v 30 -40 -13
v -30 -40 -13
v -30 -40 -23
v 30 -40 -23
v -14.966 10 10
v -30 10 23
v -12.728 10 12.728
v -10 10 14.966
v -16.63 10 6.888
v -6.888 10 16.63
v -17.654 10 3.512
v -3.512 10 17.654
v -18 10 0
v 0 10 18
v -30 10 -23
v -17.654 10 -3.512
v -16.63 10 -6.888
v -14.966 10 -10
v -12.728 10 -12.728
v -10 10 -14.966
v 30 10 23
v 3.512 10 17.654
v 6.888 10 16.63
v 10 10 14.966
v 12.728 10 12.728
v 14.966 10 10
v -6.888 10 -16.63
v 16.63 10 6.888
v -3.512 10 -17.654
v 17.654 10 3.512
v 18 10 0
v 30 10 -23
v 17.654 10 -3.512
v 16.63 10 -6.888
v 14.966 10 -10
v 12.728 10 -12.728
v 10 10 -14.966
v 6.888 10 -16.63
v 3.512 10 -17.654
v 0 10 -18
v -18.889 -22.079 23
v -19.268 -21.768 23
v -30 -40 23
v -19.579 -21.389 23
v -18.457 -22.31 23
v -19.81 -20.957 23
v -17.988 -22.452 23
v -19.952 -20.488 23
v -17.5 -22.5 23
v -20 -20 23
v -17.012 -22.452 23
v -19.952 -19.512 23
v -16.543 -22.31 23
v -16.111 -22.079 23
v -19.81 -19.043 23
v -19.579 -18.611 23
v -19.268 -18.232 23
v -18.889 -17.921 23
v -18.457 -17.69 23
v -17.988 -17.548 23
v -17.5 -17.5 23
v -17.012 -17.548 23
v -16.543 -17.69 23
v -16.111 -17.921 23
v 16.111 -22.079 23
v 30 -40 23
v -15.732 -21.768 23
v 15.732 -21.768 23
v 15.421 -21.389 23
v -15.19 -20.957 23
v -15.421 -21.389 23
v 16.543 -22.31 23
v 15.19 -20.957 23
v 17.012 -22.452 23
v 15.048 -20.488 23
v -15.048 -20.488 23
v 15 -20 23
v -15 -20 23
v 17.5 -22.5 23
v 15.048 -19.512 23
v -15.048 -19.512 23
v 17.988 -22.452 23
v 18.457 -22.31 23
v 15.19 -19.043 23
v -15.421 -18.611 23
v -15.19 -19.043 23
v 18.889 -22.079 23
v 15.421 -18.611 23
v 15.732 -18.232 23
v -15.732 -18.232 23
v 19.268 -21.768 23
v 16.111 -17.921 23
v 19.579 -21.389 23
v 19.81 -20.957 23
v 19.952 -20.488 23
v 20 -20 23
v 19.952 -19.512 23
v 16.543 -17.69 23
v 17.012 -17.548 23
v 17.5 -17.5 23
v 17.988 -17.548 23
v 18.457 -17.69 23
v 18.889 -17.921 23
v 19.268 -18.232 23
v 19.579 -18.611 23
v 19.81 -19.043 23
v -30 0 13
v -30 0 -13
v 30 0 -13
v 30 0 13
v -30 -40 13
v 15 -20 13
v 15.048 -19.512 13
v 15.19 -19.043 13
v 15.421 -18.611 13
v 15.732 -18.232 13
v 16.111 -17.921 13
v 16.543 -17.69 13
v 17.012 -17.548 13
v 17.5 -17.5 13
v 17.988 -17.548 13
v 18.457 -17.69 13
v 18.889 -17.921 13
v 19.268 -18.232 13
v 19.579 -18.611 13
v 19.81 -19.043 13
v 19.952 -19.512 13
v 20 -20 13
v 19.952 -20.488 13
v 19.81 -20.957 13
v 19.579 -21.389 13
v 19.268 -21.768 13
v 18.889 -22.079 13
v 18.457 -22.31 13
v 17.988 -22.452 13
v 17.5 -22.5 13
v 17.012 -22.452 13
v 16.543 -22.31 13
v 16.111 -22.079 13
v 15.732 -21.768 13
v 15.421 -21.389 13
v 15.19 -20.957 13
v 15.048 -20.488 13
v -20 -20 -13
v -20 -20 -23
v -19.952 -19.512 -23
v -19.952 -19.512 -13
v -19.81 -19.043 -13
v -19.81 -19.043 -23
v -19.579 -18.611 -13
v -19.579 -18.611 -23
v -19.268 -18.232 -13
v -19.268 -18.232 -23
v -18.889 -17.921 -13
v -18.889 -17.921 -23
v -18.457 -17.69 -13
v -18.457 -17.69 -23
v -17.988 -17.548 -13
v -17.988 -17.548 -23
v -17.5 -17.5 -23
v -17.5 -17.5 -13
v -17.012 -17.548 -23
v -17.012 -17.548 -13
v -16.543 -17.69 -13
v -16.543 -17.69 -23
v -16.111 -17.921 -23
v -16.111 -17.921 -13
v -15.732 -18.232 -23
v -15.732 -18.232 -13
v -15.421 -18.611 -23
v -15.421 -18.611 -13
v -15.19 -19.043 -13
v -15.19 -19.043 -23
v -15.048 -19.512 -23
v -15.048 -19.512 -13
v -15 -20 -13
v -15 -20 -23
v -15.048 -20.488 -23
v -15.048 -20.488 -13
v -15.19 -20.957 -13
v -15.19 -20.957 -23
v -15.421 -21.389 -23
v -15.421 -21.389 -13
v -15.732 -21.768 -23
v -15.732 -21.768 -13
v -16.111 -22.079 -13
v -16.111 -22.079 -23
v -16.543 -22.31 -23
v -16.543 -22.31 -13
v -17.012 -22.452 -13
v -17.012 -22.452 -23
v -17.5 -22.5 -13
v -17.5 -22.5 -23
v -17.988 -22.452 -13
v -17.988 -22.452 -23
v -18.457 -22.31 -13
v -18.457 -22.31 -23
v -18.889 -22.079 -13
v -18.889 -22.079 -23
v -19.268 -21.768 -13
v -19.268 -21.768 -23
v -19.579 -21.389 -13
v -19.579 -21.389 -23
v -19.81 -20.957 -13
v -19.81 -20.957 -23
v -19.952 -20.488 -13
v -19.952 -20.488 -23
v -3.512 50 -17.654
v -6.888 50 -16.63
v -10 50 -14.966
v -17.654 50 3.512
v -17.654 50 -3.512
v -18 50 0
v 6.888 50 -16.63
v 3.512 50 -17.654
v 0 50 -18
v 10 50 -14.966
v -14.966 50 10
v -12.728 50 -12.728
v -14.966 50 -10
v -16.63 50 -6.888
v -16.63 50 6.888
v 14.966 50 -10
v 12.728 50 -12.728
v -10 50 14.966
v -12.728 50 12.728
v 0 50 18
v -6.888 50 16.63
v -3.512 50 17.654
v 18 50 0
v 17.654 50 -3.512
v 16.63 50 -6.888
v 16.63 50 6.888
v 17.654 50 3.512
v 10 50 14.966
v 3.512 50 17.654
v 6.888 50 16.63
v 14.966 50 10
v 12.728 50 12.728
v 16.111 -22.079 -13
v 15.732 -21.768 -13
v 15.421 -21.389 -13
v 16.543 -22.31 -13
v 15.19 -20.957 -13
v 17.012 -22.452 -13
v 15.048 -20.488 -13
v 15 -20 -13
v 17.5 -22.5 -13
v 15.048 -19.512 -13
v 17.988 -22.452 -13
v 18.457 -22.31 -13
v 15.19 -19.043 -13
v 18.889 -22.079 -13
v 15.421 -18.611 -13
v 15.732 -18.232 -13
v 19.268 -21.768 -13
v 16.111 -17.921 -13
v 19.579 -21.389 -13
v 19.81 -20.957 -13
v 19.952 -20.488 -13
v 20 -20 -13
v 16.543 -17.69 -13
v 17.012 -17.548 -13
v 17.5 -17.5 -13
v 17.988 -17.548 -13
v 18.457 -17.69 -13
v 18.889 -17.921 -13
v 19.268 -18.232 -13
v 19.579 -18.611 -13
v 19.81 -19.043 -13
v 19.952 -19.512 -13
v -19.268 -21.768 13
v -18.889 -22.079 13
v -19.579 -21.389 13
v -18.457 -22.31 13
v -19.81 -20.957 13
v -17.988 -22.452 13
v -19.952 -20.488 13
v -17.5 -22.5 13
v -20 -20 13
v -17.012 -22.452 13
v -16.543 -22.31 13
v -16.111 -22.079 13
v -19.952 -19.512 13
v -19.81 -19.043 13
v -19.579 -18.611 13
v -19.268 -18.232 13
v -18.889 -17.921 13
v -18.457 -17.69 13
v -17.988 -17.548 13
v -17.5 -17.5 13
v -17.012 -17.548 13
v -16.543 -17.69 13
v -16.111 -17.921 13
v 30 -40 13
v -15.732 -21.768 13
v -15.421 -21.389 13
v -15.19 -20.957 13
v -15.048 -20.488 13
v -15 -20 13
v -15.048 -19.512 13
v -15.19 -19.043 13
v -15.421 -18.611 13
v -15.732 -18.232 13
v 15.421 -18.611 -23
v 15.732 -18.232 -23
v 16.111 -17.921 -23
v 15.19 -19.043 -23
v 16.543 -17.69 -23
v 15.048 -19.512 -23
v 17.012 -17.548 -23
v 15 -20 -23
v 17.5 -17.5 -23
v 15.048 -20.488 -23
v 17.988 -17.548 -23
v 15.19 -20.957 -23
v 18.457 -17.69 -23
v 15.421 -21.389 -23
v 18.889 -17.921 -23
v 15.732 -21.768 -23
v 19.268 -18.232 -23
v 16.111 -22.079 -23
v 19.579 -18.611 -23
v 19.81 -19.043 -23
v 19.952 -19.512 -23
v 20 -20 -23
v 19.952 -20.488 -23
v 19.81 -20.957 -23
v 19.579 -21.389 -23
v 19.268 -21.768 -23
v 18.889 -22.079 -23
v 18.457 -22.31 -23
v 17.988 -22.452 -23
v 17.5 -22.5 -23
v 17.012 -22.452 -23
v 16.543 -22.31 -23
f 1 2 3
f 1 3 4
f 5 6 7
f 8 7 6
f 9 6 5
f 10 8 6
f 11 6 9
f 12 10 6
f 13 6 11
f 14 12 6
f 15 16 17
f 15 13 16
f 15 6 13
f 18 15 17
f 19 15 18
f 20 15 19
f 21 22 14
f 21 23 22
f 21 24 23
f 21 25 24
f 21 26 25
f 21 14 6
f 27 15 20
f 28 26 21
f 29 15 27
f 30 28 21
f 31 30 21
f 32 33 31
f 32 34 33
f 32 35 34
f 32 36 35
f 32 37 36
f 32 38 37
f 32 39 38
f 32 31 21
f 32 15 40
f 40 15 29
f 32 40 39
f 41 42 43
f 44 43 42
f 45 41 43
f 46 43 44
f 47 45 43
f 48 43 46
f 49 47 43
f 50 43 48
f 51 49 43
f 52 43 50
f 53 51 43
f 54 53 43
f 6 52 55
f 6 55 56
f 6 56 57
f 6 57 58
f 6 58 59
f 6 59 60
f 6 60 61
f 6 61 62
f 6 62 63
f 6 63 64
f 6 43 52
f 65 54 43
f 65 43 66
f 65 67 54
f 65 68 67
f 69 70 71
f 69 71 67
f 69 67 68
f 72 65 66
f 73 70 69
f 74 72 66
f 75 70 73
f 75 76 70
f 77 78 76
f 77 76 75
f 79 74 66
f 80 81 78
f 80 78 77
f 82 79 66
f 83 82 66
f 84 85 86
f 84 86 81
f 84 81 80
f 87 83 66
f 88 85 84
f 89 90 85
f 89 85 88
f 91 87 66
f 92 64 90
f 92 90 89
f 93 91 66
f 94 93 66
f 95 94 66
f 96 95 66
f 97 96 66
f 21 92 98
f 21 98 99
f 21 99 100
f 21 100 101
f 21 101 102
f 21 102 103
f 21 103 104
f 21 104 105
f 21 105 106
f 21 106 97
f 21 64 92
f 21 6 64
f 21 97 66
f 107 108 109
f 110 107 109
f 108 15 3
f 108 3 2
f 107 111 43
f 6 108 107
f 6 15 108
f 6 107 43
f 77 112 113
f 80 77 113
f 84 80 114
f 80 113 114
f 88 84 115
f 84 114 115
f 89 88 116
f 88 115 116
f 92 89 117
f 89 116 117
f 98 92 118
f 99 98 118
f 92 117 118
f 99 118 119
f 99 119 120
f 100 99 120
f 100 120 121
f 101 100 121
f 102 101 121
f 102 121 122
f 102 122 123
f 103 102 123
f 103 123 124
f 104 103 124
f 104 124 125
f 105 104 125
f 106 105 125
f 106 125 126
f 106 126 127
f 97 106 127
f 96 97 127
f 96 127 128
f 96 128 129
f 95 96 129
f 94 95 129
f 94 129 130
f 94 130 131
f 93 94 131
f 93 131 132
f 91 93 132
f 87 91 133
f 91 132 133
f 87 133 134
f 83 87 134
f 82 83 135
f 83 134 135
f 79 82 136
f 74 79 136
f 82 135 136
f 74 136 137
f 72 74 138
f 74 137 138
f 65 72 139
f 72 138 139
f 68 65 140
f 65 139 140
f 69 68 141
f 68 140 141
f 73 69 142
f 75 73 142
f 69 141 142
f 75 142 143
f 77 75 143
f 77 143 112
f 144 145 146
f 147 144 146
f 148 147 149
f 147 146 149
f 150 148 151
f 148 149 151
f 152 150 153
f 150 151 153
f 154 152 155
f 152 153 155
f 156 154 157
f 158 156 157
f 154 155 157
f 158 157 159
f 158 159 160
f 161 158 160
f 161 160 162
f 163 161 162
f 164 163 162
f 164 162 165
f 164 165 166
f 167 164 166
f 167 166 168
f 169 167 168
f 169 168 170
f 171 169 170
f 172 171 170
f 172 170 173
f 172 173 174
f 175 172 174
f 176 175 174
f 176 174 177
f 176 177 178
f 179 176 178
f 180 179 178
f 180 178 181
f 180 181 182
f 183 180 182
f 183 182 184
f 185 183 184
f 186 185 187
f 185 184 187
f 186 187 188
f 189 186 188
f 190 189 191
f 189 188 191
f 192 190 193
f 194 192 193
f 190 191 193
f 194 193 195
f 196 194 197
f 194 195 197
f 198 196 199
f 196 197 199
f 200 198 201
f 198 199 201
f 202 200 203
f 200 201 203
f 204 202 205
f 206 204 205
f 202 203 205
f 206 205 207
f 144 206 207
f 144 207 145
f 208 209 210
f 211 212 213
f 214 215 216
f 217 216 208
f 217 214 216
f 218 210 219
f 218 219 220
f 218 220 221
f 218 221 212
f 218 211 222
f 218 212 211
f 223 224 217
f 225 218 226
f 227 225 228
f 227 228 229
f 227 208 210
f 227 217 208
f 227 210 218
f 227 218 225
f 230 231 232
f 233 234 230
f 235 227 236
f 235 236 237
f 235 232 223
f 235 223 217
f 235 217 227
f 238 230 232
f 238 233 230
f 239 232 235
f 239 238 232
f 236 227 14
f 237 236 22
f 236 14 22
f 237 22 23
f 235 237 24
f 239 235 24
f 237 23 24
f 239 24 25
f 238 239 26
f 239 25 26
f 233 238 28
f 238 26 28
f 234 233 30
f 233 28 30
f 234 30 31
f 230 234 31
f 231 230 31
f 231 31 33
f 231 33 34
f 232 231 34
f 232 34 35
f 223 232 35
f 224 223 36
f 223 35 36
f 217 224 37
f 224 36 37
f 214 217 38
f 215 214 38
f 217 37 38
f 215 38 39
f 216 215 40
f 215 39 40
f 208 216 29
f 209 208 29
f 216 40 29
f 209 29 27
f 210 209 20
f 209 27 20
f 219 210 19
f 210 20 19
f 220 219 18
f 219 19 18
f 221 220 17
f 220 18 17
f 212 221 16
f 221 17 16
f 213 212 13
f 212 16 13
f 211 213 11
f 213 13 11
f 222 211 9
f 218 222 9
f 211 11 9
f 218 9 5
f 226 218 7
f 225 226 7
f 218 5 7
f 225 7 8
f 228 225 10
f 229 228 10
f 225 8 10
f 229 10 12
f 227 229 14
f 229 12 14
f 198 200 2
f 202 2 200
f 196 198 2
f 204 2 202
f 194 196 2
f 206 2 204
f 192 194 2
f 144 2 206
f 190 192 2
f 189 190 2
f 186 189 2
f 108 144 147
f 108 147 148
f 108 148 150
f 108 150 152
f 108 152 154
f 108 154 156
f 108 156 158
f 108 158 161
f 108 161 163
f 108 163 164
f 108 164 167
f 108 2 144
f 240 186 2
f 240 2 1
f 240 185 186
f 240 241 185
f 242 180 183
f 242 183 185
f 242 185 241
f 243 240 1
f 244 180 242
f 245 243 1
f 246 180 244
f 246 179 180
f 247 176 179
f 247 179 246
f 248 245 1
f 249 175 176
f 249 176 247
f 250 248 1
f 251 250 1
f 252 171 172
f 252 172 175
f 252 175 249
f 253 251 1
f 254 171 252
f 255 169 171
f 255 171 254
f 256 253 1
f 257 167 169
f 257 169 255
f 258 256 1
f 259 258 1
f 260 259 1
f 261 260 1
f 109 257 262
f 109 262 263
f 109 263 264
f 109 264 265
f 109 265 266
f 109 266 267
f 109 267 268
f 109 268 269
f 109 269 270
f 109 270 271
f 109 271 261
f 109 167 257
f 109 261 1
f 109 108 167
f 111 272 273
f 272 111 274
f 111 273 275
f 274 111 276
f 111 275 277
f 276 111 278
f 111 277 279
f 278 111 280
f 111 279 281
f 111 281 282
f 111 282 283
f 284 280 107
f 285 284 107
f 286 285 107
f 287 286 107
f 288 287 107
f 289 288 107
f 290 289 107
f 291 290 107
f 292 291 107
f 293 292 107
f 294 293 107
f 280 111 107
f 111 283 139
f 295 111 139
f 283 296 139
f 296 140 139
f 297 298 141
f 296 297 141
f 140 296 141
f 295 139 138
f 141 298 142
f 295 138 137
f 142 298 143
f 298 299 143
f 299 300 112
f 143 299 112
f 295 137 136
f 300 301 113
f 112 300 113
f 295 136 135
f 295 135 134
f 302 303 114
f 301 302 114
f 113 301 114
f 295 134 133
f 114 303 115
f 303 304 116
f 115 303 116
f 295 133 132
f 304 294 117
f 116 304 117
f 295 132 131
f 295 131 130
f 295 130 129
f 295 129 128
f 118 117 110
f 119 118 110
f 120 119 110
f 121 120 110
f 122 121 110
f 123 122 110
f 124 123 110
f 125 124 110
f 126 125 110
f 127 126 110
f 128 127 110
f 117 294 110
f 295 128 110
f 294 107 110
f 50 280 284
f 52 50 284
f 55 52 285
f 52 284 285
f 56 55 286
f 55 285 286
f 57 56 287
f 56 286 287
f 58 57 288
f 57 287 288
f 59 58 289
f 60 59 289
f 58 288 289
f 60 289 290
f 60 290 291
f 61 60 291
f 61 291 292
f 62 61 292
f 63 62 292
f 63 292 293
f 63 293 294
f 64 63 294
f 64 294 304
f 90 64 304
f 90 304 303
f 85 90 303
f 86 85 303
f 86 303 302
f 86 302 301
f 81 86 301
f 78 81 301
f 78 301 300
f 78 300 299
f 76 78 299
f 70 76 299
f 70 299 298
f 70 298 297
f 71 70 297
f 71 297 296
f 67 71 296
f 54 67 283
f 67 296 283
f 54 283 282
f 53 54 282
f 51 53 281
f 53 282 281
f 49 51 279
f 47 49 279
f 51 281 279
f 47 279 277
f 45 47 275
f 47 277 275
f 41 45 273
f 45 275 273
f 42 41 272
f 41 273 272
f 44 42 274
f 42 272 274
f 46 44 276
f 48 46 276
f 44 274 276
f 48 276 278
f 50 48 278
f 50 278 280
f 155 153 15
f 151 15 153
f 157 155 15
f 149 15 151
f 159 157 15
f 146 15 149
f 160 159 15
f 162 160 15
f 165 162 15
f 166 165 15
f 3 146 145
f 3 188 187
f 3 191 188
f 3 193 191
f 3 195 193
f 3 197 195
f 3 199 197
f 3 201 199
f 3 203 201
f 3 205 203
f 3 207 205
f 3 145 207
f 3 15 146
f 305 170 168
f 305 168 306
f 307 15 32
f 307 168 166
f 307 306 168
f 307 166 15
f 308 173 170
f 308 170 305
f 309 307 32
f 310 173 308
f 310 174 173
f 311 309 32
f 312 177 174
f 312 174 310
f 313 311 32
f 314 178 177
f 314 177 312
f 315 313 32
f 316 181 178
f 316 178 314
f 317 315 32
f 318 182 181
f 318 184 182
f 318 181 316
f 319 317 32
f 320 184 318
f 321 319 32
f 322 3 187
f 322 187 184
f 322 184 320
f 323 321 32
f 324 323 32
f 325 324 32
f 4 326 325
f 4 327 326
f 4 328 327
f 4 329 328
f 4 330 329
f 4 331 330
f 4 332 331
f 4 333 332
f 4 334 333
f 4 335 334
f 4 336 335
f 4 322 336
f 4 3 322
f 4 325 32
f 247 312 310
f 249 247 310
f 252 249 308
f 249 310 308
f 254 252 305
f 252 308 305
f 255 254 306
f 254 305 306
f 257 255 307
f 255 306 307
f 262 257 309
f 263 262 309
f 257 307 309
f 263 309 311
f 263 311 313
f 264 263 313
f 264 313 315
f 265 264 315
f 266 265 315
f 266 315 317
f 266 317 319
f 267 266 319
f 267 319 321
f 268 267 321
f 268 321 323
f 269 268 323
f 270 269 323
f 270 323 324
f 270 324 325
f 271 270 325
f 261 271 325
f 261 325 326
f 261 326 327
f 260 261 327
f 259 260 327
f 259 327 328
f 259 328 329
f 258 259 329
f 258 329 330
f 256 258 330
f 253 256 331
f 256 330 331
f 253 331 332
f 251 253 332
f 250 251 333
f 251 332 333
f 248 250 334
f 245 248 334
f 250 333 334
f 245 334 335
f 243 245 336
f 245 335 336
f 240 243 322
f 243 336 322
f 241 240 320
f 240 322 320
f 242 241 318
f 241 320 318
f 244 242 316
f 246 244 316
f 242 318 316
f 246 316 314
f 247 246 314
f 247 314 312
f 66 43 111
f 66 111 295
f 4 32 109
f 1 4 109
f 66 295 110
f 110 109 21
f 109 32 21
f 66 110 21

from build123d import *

# Parameters (mm, degrees)
SKETCH1_W           = 60
SKETCH1_H           = 46
BOSS_EXTRUDE1_DEPTH = 10
SKETCH2_W           = 60
SKETCH2_H           = 10
BOSS_EXTRUDE2_DEPTH = 40
SKETCH3_R           = 18
BOSS_EXTRUDE3_DEPTH = 40
SKETCH4_R           = 2.5
CUT_EXTRUDE1_DEPTH  = 75.269778511


with BuildPart() as part:
    # Sketch1 → Boss-Extrude1 (new body)
    with BuildSketch(Plane(origin=(0, 0, 0), x_dir=(1, 0, 0), z_dir=(0, 1, 0))):
        Rectangle(SKETCH1_W, SKETCH1_H)
    extrude(amount=BOSS_EXTRUDE1_DEPTH)

    # Sketch2 → Boss-Extrude2 (add)
    with BuildSketch(Plane.XZ):
        with Locations((0, 18)):
            Rectangle(SKETCH2_W, SKETCH2_H)
        with Locations((0, -18)):
            Rectangle(SKETCH2_W, SKETCH2_H)
    extrude(amount=BOSS_EXTRUDE2_DEPTH)

    # Sketch3 → Boss-Extrude3 (add)
    with BuildSketch(Plane(origin=(0, 10, 0), x_dir=(1, 0, 0), z_dir=(0, 1, 0))):
        with Locations(Location((0, 0, 0), (0, 0, 270))):
            Circle(SKETCH3_R)
    extrude(amount=BOSS_EXTRUDE3_DEPTH)

    # Sketch4 → Cut-Extrude1 (cut, through all)
    with BuildSketch(Plane(origin=(0, 0, -23), x_dir=(-1, 0, 0), z_dir=(0, 0, -1))):
        with Locations((-17.5, -20)):
            Circle(SKETCH4_R)
        with Locations((17.5, -20)):
            Circle(SKETCH4_R)
    extrude(amount=-CUT_EXTRUDE1_DEPTH, mode=Mode.SUBTRACT)


solid = part.part
